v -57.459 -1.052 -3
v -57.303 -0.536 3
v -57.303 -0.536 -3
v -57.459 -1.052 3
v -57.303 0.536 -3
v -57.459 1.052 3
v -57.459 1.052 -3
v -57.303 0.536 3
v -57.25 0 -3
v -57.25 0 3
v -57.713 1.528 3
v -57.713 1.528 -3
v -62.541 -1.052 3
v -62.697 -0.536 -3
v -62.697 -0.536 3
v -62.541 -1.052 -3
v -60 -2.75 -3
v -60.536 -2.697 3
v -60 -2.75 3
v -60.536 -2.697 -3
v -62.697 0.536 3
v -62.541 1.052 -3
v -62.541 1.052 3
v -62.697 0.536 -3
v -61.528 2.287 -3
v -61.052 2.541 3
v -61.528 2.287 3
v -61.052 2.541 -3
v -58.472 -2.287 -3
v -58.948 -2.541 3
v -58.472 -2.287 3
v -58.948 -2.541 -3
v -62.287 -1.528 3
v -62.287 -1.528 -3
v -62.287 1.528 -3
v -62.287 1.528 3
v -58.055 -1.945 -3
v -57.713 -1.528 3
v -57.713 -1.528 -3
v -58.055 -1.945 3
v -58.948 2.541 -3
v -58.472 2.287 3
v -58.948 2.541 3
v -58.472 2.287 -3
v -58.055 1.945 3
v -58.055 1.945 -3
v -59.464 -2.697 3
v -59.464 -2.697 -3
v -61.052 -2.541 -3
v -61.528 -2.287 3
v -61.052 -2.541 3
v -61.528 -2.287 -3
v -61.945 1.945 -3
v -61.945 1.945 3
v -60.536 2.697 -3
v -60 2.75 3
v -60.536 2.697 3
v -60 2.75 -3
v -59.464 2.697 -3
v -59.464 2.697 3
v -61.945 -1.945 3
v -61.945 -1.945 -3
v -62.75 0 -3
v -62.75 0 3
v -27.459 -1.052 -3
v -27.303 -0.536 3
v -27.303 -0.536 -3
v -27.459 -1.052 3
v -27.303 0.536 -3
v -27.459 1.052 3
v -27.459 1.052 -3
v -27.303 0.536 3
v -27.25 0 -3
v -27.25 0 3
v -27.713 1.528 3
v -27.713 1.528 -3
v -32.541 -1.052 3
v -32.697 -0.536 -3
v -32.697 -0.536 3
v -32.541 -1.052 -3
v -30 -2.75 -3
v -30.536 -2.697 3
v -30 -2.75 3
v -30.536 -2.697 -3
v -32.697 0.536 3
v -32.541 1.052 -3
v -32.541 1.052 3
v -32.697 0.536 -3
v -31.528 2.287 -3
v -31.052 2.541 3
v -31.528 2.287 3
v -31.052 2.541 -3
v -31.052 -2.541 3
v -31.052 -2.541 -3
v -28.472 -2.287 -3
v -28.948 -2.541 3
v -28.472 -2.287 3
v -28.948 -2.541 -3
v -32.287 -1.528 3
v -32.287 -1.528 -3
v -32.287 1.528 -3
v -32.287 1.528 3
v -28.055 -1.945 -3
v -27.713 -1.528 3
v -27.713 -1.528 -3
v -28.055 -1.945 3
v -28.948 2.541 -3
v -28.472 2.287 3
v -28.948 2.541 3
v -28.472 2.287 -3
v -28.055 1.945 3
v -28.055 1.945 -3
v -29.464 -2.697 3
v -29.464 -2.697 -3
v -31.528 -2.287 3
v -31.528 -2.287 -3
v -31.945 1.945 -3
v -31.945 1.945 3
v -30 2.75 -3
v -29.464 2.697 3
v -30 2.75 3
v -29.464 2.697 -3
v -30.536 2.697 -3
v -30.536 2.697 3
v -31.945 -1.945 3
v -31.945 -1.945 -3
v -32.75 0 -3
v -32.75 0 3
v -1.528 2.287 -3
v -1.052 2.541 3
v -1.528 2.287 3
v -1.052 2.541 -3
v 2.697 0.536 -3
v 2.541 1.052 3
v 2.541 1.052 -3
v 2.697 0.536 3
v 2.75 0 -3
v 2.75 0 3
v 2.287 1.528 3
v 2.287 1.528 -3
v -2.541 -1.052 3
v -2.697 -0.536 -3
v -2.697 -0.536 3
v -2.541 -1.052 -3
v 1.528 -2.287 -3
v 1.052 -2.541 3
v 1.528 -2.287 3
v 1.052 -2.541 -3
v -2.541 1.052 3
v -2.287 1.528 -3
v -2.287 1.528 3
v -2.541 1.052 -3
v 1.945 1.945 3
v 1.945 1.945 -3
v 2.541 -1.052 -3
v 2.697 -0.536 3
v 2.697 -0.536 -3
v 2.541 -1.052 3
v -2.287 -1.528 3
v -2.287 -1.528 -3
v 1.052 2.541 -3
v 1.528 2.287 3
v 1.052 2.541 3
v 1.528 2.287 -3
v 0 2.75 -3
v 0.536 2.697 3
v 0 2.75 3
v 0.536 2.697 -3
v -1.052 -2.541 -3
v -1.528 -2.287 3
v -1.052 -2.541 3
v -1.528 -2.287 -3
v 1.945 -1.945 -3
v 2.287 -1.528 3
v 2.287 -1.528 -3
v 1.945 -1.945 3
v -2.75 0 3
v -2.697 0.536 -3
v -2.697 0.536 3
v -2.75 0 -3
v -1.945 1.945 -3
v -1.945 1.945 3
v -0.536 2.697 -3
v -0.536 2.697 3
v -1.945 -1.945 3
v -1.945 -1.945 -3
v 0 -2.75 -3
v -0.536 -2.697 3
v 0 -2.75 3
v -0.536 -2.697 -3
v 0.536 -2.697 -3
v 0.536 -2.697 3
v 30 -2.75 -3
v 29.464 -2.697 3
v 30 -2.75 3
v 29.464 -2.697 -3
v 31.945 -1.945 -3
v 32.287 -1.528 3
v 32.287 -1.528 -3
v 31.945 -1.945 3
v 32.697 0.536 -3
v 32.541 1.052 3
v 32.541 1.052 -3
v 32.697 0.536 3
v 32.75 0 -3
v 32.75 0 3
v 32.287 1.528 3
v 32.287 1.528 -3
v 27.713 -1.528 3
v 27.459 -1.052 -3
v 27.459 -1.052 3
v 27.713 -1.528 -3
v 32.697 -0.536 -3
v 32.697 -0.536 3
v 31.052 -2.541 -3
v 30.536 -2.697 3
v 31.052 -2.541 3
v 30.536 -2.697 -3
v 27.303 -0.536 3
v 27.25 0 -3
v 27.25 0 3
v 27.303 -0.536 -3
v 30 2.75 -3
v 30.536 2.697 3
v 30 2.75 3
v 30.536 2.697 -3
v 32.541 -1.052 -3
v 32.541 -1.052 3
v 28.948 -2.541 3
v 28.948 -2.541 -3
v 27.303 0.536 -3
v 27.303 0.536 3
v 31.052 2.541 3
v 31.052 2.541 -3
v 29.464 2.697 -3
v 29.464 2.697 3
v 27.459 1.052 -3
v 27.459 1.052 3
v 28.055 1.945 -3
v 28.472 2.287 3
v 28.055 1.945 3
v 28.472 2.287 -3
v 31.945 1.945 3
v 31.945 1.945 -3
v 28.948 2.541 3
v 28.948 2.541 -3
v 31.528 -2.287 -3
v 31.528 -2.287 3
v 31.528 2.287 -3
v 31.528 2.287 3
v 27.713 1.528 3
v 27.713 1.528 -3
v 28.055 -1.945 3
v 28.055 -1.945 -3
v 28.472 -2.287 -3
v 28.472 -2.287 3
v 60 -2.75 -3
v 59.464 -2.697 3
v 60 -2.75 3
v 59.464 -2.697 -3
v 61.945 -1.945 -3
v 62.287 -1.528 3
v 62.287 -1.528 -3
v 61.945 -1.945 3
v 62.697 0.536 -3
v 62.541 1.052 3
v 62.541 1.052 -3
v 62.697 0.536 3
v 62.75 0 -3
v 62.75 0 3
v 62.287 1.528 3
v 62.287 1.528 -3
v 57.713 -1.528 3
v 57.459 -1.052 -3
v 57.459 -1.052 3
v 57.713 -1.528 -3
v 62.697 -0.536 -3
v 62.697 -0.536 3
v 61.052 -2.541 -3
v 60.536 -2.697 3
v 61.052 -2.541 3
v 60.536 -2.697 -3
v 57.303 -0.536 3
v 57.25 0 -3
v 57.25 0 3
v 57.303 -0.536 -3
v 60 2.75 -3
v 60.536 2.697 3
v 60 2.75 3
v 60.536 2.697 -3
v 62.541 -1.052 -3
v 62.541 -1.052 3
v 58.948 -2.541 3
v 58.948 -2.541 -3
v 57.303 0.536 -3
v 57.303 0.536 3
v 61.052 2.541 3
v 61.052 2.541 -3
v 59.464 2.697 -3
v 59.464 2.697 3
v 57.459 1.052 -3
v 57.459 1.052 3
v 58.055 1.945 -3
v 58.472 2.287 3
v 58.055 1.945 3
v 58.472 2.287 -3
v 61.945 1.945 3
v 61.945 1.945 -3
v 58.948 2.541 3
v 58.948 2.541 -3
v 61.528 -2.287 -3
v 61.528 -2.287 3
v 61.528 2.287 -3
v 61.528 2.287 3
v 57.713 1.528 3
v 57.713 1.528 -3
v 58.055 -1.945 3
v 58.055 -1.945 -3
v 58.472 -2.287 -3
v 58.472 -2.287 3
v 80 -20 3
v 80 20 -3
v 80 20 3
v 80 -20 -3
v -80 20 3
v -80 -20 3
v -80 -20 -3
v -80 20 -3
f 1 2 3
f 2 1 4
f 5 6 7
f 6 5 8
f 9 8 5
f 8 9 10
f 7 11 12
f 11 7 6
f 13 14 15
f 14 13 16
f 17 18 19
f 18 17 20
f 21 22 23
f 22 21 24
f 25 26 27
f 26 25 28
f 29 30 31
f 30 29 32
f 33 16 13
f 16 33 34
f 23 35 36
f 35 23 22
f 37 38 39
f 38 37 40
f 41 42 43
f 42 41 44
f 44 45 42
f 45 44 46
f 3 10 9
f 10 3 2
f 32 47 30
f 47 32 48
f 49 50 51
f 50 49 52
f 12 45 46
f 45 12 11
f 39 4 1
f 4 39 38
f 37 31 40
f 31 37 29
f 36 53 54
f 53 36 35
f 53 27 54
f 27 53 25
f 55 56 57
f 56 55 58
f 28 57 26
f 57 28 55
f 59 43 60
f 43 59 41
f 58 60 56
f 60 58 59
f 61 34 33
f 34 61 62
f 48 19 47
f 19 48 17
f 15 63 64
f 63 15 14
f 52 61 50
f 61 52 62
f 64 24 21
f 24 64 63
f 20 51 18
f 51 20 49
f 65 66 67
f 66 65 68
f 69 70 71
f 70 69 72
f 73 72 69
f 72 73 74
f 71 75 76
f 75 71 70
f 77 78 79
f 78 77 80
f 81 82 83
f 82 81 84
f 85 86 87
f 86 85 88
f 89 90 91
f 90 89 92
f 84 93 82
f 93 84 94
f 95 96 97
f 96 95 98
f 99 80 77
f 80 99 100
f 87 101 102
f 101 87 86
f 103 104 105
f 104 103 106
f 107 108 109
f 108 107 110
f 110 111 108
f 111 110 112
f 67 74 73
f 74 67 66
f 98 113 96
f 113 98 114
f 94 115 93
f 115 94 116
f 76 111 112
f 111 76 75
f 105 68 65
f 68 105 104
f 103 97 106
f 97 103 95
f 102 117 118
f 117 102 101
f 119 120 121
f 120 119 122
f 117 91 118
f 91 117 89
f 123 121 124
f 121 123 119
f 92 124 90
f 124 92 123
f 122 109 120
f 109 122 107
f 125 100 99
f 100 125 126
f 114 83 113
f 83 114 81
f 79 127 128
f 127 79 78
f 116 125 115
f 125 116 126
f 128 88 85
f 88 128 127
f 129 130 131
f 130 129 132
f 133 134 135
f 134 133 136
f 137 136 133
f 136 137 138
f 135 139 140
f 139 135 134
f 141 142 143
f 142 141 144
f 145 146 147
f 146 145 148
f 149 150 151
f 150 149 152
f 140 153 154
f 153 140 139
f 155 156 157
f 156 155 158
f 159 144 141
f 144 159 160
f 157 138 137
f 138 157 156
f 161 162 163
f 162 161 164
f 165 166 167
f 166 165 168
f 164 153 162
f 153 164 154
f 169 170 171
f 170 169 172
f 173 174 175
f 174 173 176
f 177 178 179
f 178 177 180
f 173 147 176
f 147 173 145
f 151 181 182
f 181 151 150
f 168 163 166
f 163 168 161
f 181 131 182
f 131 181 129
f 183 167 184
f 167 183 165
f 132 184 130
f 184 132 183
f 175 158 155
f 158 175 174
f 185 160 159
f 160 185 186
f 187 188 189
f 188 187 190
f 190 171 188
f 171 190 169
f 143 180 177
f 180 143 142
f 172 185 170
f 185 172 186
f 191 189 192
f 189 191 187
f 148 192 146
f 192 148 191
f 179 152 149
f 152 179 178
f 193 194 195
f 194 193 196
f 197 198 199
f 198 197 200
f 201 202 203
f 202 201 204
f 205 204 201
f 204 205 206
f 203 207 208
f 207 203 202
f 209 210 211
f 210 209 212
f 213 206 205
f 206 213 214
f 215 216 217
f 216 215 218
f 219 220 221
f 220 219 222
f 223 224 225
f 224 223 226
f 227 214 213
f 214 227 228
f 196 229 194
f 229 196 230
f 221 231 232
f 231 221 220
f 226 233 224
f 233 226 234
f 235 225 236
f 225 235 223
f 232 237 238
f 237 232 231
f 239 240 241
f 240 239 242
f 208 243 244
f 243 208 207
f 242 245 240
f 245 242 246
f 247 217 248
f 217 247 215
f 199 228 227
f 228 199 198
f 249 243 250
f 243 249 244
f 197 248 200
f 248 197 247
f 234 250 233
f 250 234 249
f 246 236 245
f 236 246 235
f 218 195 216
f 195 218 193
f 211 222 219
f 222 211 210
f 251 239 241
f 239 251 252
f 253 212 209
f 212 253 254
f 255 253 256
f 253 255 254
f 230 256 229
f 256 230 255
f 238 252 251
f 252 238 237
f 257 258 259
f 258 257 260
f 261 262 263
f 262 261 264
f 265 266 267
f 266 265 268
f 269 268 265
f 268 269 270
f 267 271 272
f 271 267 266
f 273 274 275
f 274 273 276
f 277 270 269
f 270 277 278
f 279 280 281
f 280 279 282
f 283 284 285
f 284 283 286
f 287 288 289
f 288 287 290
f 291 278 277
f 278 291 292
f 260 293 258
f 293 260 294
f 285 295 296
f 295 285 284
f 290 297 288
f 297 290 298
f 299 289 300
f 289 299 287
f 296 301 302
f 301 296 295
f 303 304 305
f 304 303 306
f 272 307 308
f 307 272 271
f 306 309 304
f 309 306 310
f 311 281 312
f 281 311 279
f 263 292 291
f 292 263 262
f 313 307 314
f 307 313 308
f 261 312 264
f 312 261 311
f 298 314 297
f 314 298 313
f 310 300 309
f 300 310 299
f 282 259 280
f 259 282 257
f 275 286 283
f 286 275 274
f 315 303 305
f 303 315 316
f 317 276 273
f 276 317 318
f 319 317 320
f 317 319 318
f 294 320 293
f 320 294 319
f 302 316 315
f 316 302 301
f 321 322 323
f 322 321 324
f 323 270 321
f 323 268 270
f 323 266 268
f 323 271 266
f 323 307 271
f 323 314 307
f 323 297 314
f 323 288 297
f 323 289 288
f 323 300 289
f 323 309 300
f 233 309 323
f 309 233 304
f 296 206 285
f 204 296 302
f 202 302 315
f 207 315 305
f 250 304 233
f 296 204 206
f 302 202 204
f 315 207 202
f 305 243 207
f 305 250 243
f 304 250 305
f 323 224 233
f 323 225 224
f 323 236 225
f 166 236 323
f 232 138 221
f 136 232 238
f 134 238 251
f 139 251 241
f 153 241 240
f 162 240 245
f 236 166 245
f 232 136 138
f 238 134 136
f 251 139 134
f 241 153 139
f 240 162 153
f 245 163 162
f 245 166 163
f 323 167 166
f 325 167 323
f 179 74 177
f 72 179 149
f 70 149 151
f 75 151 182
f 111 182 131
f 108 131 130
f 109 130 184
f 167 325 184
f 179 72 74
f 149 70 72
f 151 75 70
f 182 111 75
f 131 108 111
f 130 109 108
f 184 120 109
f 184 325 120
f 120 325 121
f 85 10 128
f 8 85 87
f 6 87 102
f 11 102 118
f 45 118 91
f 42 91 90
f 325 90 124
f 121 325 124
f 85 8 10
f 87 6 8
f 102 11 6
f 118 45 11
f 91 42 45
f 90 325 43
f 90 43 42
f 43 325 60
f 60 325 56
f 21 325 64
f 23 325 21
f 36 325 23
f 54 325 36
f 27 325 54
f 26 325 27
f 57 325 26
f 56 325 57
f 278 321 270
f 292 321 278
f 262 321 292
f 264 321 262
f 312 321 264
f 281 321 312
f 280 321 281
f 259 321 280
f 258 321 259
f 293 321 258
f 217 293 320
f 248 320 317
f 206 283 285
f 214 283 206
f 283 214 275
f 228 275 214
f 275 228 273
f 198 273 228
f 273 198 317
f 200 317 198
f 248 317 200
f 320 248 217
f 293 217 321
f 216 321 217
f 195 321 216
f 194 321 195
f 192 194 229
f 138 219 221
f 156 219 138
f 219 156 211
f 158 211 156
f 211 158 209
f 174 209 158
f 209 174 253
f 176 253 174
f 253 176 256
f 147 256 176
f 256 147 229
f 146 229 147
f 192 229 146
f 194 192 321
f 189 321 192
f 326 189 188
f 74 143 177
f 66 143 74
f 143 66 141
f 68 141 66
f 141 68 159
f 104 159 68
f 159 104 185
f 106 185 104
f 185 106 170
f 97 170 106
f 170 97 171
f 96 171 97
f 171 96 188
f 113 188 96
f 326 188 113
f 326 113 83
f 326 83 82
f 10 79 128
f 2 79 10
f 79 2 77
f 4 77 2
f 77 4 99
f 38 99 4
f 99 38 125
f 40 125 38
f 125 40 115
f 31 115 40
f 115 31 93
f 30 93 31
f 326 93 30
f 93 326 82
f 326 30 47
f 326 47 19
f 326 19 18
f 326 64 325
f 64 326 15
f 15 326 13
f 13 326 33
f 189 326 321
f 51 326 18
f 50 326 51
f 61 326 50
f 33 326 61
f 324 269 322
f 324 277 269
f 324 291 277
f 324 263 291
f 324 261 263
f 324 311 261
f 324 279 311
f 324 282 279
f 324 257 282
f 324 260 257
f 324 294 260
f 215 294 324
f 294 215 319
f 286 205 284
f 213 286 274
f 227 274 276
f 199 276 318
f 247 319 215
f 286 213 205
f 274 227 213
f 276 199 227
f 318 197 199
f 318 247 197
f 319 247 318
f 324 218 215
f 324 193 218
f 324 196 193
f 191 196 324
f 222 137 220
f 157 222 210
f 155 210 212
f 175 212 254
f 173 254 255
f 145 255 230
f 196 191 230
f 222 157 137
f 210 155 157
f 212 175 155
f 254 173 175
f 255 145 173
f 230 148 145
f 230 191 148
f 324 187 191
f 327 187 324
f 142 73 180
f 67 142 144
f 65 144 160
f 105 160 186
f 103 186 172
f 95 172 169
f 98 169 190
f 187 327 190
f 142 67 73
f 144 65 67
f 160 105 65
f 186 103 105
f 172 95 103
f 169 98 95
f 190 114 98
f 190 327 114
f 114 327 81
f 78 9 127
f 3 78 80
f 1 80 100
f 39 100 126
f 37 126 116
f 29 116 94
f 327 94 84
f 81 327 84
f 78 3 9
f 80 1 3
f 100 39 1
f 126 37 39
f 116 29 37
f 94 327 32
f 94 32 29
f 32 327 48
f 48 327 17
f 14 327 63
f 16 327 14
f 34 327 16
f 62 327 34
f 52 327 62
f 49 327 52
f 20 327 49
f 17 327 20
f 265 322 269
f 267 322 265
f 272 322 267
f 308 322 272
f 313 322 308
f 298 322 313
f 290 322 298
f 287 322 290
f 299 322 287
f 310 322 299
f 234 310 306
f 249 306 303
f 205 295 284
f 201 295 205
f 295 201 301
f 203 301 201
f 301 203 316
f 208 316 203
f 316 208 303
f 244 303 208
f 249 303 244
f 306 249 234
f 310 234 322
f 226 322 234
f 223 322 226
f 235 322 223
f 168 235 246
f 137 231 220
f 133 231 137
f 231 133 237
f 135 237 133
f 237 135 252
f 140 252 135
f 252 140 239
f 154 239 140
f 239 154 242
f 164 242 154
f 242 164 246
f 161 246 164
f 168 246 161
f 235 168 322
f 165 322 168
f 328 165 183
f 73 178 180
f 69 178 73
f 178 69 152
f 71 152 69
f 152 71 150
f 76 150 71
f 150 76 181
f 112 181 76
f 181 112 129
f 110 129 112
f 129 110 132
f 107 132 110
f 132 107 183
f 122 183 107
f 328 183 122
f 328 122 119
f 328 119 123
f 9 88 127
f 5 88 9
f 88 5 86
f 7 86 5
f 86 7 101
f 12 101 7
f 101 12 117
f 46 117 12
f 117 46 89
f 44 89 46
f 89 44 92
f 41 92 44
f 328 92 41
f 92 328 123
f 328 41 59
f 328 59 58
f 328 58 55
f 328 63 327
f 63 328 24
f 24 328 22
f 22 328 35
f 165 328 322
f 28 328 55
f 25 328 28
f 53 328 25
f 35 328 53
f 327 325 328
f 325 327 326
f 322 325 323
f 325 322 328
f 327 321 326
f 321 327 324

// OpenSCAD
$fn = 32;

// ----------------------------------------------------------------------
// Hole bar, 5 x Ø5.5
// skip layout, 20 mm edge offset
// ----------------------------------------------------------------------

// --- parameters (mm) ---
bar_w = 40;       // bar width (Y)
bar_t = 6;        // bar thickness (Z)
holes = 5;        // holes per row
hole_d = 5.5;     // hole diameter
edge = 20;        // offset from the bar end to the first hole
grid_pitch = 15;  // grid the bar was laid out on

// --- derived feature positions (mm) ---
pitch = grid_pitch * 2;       // = 30   holes sit every other grid slot
span = (holes - 1) * pitch;   // = 120   distance between the end holes
bar_l = span + 2 * edge;      // = 160   overall bar length
start_x = -bar_l / 2 + edge;  // = -60   X of the first hole
feature_centers = [
  [start_x + 0 * pitch, 0],
  [start_x + 1 * pitch, 0],
  [start_x + 2 * pitch, 0],
  [start_x + 3 * pitch, 0],
  [start_x + 4 * pitch, 0]
];   // hole centres of the first row

// bar with one row of holes, drilled from feature_centers
difference() {
  translate([-bar_l / 2, -bar_w / 2, -bar_t / 2]) cube([bar_l, bar_w, bar_t]);
  for (centre = feature_centers)
    translate([centre[0], centre[1], 0])
      cylinder(d = hole_d, h = bar_t + 2, center = true);
}
